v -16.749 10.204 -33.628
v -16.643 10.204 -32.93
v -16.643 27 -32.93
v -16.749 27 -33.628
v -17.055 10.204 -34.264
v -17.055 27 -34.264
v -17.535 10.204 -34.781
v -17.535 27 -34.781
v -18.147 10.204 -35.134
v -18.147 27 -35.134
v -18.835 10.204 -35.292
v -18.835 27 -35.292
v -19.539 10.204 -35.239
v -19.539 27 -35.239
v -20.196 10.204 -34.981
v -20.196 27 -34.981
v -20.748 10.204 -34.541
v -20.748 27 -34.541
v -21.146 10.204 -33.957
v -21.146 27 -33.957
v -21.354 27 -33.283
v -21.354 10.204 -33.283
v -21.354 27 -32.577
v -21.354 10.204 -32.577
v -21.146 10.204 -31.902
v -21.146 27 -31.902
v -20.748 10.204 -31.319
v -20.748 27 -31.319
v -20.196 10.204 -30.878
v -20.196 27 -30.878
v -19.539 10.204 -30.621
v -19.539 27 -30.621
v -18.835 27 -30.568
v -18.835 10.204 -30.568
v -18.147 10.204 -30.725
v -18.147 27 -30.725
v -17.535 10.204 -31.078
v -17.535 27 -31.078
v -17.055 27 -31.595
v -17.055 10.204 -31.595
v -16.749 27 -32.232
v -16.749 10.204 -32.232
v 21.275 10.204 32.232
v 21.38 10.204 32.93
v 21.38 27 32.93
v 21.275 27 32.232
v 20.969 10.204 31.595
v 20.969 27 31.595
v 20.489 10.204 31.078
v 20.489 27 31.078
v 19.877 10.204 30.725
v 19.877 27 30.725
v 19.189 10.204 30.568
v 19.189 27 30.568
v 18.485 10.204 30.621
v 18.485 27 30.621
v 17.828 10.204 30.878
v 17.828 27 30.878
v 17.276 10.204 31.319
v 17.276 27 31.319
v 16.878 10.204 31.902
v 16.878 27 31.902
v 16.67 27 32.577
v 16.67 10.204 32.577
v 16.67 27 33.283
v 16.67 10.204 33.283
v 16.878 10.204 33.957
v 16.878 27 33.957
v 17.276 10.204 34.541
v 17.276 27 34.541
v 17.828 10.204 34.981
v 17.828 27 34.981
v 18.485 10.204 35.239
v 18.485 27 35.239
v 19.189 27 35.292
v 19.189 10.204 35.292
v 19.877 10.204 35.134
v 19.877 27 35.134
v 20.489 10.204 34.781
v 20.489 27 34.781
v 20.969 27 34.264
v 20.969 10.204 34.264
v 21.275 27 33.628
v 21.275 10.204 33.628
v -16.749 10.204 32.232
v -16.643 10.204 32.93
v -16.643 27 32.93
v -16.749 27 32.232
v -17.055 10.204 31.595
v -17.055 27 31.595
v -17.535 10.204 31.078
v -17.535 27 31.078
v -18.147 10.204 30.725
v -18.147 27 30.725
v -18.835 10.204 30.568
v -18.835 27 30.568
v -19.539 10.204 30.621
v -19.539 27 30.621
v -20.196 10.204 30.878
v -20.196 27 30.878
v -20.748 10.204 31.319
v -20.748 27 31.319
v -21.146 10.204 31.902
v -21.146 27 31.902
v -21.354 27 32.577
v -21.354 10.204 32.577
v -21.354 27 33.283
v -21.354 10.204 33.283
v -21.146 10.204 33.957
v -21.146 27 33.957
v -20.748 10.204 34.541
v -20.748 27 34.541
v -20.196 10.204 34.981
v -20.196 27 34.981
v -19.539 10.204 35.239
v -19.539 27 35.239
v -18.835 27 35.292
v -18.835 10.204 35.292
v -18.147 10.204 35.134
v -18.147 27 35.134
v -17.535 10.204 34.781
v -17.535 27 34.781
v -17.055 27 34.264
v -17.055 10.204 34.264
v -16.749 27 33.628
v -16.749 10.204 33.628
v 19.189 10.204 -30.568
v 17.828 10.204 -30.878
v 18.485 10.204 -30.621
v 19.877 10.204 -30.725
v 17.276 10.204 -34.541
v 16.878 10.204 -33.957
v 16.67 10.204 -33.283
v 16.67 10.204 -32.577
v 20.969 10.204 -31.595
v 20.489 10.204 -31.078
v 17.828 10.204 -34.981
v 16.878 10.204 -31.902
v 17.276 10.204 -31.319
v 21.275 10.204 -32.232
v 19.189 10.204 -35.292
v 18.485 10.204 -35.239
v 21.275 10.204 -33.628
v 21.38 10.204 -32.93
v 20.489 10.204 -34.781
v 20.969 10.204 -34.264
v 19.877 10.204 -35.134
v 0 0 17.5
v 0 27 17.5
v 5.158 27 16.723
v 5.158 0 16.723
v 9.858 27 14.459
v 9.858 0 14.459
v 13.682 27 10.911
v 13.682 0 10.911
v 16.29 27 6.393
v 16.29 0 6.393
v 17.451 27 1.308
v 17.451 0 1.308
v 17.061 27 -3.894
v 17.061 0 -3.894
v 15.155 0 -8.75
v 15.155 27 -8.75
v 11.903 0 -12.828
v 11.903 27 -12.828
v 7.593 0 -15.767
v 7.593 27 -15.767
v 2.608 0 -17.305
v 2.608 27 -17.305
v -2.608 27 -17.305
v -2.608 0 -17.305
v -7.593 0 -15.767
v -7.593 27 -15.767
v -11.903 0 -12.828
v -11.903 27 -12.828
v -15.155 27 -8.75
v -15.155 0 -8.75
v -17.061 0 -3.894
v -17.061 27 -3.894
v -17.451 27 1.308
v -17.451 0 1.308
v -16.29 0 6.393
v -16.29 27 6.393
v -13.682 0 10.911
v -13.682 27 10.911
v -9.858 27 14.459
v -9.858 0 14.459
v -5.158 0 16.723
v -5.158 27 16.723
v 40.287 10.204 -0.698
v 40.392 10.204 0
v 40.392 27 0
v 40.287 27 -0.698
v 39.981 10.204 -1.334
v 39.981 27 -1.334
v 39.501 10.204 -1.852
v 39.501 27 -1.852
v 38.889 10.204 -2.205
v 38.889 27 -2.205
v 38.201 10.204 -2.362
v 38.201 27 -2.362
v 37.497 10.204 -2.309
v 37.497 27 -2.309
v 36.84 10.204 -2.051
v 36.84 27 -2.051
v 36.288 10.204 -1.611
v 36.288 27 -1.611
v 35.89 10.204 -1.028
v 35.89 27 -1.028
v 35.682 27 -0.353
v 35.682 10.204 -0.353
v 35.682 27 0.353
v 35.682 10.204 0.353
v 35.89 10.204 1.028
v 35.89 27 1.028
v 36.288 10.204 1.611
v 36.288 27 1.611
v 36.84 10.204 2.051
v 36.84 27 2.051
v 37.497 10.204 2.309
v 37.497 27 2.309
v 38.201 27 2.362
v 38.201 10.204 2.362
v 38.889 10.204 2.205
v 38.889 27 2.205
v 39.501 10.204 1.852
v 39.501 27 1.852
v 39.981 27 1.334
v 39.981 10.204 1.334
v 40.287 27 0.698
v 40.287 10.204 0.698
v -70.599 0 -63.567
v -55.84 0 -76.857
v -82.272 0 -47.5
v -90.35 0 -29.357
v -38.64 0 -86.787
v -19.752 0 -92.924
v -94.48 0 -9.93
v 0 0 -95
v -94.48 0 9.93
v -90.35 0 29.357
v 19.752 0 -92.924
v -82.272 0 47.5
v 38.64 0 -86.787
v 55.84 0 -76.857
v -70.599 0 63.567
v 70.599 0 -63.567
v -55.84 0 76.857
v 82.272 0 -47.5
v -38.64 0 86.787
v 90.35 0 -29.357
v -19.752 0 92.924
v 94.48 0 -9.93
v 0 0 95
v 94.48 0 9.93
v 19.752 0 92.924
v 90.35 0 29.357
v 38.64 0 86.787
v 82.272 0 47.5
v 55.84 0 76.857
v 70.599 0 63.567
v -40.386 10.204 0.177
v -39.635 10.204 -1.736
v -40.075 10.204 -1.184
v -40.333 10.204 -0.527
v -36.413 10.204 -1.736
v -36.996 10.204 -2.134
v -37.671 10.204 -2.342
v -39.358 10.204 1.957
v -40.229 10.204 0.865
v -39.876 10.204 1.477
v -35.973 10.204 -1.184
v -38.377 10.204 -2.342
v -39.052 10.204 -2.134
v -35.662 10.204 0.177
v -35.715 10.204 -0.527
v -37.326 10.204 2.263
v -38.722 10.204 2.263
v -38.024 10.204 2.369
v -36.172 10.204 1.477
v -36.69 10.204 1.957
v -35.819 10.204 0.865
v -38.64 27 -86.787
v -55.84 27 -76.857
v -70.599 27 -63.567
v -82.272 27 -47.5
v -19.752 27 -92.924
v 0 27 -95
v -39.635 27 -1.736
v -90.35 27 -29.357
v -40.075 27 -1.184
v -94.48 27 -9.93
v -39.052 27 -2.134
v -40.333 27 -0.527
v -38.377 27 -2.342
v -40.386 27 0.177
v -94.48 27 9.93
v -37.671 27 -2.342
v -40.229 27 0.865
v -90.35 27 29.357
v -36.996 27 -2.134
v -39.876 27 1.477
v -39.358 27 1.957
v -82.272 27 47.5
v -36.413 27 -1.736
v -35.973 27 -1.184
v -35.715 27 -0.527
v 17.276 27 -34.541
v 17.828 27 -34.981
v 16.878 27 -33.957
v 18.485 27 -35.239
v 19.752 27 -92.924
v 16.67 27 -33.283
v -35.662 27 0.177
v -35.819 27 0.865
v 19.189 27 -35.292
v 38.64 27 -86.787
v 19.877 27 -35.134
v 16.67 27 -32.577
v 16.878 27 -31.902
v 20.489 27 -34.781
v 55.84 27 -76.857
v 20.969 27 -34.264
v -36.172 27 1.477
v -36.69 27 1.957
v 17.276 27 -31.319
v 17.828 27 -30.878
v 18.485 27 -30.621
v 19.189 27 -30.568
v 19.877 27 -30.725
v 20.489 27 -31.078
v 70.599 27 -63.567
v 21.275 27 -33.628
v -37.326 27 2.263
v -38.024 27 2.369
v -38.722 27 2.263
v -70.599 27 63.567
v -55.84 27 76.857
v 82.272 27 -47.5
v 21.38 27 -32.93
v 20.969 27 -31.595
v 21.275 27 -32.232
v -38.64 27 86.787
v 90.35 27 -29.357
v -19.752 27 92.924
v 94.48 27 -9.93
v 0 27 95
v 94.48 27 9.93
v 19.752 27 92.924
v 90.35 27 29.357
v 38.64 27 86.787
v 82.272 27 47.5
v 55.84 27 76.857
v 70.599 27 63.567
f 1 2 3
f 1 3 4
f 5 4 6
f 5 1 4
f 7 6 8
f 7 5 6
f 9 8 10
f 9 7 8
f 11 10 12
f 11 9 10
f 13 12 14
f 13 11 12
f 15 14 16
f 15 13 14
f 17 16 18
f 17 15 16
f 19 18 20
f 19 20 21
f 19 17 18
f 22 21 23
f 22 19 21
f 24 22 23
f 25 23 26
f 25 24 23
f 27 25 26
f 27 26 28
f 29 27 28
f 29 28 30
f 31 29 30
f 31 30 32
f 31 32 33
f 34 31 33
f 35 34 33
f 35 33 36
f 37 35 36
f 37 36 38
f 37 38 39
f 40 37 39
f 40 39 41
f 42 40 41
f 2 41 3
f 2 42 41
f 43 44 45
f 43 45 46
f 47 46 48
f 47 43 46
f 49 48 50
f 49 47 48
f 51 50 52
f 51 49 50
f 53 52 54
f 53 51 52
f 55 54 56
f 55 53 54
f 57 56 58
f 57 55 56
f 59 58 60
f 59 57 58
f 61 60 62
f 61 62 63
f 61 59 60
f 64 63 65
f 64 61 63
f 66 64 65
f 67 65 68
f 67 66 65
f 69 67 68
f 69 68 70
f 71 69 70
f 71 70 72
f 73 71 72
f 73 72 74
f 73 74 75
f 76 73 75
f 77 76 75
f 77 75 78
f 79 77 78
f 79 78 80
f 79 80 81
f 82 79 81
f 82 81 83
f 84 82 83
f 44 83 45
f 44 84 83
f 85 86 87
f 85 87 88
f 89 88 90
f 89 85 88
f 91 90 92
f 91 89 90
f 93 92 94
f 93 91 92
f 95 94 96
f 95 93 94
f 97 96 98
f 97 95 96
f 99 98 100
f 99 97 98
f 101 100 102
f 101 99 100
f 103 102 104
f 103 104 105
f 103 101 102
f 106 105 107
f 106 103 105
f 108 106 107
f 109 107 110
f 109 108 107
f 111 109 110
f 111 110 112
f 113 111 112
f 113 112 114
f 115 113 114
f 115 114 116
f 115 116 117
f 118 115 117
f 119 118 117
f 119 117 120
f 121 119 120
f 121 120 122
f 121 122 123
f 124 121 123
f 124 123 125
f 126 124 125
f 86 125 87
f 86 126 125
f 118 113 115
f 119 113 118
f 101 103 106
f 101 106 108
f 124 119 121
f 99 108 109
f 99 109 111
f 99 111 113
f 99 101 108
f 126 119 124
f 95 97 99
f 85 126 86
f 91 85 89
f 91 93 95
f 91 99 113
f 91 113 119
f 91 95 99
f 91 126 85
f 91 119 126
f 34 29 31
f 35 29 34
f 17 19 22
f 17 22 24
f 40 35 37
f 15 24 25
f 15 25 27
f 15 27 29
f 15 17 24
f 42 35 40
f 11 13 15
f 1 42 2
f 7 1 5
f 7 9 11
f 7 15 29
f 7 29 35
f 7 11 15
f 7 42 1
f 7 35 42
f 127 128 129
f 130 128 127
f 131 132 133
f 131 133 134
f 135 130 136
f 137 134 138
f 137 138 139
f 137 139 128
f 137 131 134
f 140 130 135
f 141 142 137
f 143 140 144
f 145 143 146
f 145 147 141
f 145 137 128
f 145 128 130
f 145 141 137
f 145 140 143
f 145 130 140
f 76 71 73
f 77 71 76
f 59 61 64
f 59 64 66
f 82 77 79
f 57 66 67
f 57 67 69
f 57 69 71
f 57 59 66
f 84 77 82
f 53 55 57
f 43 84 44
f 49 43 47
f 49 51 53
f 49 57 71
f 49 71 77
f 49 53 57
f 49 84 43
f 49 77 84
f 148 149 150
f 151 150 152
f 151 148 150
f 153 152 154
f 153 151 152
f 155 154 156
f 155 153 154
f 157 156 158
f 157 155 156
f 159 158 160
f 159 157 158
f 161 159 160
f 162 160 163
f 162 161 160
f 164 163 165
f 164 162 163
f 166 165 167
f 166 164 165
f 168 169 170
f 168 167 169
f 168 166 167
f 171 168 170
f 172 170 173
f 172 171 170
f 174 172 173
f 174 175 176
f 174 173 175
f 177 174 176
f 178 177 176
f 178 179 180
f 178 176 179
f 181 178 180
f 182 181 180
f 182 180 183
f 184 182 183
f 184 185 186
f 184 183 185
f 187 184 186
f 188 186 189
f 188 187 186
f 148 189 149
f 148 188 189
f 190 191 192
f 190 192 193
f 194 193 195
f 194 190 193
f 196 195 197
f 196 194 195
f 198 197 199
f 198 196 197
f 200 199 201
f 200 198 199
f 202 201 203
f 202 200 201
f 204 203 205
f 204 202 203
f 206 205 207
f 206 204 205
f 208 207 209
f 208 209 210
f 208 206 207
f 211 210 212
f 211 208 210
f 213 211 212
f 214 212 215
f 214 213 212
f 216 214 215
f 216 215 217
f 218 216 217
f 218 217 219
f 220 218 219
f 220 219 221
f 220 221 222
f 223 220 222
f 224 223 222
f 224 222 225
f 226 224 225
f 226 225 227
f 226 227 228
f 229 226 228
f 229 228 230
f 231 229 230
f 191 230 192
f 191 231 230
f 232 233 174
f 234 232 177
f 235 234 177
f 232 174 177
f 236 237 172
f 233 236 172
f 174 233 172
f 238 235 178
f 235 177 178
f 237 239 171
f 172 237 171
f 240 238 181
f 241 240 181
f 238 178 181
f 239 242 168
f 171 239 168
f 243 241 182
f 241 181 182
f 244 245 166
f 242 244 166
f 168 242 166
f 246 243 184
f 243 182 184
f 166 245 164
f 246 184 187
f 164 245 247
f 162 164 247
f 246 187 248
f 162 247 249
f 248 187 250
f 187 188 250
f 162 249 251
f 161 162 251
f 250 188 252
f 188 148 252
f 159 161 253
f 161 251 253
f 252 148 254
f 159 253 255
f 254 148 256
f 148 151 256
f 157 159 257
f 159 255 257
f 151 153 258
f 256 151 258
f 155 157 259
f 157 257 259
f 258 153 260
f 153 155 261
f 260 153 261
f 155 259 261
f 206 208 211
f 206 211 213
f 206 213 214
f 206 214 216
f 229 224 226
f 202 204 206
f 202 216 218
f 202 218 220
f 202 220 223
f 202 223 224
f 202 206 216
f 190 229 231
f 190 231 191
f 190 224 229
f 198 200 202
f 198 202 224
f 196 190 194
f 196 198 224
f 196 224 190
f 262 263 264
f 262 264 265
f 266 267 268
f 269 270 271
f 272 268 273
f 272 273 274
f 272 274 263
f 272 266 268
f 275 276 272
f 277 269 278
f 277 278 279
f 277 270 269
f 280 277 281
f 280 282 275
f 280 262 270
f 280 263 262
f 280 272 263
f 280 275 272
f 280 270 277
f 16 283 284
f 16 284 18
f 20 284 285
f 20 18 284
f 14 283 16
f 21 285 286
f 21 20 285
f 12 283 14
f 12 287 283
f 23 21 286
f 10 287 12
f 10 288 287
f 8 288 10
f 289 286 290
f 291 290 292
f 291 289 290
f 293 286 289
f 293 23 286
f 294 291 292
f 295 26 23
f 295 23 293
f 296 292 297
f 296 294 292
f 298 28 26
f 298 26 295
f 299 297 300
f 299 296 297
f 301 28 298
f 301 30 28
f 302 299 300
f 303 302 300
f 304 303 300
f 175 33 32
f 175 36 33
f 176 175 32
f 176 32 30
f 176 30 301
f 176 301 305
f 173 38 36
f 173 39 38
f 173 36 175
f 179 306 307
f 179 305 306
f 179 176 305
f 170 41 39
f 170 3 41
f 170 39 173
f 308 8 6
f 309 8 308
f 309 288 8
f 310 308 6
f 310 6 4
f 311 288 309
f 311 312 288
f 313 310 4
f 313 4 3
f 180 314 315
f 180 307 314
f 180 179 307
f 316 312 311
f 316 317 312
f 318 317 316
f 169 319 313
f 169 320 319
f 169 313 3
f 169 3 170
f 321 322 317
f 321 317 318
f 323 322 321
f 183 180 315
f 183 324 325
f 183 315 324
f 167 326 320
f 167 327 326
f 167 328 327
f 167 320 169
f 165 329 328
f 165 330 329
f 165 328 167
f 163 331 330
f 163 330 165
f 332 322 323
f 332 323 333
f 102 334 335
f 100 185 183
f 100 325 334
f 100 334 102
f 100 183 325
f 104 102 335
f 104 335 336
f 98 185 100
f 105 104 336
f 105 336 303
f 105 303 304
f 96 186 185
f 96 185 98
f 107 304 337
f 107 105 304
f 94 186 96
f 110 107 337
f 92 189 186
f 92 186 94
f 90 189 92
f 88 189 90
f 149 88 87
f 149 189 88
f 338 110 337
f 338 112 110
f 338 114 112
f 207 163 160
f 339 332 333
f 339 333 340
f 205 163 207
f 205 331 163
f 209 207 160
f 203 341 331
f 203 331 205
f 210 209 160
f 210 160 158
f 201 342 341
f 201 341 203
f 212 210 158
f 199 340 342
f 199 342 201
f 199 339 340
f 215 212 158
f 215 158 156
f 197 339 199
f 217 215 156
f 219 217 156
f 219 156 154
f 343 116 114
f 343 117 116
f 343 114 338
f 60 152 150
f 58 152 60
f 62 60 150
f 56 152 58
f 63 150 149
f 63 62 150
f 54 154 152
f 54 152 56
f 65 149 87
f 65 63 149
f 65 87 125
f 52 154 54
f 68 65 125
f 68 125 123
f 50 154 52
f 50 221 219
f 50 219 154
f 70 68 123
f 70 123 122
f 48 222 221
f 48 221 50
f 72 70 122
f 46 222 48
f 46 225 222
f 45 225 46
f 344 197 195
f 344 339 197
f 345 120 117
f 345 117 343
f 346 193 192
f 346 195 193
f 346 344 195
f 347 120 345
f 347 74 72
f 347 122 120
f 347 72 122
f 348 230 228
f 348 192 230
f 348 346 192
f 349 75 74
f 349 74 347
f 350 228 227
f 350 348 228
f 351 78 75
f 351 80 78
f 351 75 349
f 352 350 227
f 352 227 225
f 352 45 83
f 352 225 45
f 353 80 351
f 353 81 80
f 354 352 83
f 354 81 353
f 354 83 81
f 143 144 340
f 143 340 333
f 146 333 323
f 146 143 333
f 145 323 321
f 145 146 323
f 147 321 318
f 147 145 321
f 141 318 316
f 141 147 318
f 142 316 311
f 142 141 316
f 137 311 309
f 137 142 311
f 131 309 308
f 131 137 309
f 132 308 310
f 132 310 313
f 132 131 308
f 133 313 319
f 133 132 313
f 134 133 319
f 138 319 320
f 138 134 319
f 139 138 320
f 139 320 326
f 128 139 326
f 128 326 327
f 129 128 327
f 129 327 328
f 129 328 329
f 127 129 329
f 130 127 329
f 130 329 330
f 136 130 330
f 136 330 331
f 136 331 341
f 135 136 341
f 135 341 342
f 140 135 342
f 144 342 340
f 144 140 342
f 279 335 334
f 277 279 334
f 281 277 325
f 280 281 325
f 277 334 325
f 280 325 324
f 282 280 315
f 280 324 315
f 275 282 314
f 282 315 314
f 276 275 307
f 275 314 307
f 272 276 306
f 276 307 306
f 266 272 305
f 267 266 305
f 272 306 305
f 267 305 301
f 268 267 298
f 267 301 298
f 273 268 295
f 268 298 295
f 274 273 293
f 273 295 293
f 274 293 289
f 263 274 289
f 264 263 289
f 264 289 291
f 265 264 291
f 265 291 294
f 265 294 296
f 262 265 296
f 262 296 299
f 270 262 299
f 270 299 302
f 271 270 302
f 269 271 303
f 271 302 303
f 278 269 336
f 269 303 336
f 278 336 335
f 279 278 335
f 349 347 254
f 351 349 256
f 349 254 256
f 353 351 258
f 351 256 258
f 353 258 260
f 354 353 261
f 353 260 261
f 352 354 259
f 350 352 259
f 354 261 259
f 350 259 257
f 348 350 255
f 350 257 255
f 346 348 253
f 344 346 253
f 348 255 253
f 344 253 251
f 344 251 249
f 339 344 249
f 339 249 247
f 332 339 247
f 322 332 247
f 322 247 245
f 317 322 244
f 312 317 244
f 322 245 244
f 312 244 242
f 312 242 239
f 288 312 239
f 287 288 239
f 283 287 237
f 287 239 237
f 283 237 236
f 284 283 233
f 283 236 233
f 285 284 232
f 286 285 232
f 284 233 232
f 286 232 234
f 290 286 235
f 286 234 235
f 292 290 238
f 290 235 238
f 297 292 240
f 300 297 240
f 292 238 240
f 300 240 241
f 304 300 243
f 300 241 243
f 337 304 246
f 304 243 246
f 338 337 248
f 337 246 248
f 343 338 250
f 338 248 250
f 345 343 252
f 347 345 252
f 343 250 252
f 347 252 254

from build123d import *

# Parameters (mm, degrees)
SKETCH1_R           = 95
BOSS_EXTRUDE1_DEPTH = 27
SKETCH2_R           = 17.5
CUT_EXTRUDE1_DEPTH  = 138.03649149
SKETCH3_R           = 2.368500587
CUT_EXTRUDE2_DEPTH  = 16.79588057
CIRPATTERN1_COUNT   = 6


with BuildPart() as part:
    # Sketch1 → Boss-Extrude1 (new body)
    with BuildSketch(Plane(origin=(0, 0, 0), x_dir=(1, 0, 0), z_dir=(0, 1, 0))):
        Circle(SKETCH1_R)
    extrude(amount=BOSS_EXTRUDE1_DEPTH)

    # Sketch2 → Cut-Extrude1 (cut, through all)
    with BuildSketch(Plane(origin=(0, 0, 0), x_dir=(1, 0, 0), z_dir=(0, 1, 0))):
        Circle(SKETCH2_R)
    extrude(amount=CUT_EXTRUDE1_DEPTH, mode=Mode.SUBTRACT)

    # Sketch3 → Cut-Extrude2 (cut)
    with BuildSketch(Plane(origin=(0, 27, 0), x_dir=(1, 0, 0), z_dir=(0, 1, 0))):
        with Locations((-38.023879586, 0)):
            Circle(SKETCH3_R)
    cut_extrude2 = extrude(amount=-CUT_EXTRUDE2_DEPTH, mode=Mode.SUBTRACT)

    # CirPattern1: Cut-Extrude2 ×6 about axis
    cirpattern1_axis = Axis((0, 0, 0), (0, 1, 0))
    for i in range(1, CIRPATTERN1_COUNT):
        add(cut_extrude2.rotate(cirpattern1_axis, i * 360 / CIRPATTERN1_COUNT), mode=Mode.SUBTRACT)


solid = part.part
